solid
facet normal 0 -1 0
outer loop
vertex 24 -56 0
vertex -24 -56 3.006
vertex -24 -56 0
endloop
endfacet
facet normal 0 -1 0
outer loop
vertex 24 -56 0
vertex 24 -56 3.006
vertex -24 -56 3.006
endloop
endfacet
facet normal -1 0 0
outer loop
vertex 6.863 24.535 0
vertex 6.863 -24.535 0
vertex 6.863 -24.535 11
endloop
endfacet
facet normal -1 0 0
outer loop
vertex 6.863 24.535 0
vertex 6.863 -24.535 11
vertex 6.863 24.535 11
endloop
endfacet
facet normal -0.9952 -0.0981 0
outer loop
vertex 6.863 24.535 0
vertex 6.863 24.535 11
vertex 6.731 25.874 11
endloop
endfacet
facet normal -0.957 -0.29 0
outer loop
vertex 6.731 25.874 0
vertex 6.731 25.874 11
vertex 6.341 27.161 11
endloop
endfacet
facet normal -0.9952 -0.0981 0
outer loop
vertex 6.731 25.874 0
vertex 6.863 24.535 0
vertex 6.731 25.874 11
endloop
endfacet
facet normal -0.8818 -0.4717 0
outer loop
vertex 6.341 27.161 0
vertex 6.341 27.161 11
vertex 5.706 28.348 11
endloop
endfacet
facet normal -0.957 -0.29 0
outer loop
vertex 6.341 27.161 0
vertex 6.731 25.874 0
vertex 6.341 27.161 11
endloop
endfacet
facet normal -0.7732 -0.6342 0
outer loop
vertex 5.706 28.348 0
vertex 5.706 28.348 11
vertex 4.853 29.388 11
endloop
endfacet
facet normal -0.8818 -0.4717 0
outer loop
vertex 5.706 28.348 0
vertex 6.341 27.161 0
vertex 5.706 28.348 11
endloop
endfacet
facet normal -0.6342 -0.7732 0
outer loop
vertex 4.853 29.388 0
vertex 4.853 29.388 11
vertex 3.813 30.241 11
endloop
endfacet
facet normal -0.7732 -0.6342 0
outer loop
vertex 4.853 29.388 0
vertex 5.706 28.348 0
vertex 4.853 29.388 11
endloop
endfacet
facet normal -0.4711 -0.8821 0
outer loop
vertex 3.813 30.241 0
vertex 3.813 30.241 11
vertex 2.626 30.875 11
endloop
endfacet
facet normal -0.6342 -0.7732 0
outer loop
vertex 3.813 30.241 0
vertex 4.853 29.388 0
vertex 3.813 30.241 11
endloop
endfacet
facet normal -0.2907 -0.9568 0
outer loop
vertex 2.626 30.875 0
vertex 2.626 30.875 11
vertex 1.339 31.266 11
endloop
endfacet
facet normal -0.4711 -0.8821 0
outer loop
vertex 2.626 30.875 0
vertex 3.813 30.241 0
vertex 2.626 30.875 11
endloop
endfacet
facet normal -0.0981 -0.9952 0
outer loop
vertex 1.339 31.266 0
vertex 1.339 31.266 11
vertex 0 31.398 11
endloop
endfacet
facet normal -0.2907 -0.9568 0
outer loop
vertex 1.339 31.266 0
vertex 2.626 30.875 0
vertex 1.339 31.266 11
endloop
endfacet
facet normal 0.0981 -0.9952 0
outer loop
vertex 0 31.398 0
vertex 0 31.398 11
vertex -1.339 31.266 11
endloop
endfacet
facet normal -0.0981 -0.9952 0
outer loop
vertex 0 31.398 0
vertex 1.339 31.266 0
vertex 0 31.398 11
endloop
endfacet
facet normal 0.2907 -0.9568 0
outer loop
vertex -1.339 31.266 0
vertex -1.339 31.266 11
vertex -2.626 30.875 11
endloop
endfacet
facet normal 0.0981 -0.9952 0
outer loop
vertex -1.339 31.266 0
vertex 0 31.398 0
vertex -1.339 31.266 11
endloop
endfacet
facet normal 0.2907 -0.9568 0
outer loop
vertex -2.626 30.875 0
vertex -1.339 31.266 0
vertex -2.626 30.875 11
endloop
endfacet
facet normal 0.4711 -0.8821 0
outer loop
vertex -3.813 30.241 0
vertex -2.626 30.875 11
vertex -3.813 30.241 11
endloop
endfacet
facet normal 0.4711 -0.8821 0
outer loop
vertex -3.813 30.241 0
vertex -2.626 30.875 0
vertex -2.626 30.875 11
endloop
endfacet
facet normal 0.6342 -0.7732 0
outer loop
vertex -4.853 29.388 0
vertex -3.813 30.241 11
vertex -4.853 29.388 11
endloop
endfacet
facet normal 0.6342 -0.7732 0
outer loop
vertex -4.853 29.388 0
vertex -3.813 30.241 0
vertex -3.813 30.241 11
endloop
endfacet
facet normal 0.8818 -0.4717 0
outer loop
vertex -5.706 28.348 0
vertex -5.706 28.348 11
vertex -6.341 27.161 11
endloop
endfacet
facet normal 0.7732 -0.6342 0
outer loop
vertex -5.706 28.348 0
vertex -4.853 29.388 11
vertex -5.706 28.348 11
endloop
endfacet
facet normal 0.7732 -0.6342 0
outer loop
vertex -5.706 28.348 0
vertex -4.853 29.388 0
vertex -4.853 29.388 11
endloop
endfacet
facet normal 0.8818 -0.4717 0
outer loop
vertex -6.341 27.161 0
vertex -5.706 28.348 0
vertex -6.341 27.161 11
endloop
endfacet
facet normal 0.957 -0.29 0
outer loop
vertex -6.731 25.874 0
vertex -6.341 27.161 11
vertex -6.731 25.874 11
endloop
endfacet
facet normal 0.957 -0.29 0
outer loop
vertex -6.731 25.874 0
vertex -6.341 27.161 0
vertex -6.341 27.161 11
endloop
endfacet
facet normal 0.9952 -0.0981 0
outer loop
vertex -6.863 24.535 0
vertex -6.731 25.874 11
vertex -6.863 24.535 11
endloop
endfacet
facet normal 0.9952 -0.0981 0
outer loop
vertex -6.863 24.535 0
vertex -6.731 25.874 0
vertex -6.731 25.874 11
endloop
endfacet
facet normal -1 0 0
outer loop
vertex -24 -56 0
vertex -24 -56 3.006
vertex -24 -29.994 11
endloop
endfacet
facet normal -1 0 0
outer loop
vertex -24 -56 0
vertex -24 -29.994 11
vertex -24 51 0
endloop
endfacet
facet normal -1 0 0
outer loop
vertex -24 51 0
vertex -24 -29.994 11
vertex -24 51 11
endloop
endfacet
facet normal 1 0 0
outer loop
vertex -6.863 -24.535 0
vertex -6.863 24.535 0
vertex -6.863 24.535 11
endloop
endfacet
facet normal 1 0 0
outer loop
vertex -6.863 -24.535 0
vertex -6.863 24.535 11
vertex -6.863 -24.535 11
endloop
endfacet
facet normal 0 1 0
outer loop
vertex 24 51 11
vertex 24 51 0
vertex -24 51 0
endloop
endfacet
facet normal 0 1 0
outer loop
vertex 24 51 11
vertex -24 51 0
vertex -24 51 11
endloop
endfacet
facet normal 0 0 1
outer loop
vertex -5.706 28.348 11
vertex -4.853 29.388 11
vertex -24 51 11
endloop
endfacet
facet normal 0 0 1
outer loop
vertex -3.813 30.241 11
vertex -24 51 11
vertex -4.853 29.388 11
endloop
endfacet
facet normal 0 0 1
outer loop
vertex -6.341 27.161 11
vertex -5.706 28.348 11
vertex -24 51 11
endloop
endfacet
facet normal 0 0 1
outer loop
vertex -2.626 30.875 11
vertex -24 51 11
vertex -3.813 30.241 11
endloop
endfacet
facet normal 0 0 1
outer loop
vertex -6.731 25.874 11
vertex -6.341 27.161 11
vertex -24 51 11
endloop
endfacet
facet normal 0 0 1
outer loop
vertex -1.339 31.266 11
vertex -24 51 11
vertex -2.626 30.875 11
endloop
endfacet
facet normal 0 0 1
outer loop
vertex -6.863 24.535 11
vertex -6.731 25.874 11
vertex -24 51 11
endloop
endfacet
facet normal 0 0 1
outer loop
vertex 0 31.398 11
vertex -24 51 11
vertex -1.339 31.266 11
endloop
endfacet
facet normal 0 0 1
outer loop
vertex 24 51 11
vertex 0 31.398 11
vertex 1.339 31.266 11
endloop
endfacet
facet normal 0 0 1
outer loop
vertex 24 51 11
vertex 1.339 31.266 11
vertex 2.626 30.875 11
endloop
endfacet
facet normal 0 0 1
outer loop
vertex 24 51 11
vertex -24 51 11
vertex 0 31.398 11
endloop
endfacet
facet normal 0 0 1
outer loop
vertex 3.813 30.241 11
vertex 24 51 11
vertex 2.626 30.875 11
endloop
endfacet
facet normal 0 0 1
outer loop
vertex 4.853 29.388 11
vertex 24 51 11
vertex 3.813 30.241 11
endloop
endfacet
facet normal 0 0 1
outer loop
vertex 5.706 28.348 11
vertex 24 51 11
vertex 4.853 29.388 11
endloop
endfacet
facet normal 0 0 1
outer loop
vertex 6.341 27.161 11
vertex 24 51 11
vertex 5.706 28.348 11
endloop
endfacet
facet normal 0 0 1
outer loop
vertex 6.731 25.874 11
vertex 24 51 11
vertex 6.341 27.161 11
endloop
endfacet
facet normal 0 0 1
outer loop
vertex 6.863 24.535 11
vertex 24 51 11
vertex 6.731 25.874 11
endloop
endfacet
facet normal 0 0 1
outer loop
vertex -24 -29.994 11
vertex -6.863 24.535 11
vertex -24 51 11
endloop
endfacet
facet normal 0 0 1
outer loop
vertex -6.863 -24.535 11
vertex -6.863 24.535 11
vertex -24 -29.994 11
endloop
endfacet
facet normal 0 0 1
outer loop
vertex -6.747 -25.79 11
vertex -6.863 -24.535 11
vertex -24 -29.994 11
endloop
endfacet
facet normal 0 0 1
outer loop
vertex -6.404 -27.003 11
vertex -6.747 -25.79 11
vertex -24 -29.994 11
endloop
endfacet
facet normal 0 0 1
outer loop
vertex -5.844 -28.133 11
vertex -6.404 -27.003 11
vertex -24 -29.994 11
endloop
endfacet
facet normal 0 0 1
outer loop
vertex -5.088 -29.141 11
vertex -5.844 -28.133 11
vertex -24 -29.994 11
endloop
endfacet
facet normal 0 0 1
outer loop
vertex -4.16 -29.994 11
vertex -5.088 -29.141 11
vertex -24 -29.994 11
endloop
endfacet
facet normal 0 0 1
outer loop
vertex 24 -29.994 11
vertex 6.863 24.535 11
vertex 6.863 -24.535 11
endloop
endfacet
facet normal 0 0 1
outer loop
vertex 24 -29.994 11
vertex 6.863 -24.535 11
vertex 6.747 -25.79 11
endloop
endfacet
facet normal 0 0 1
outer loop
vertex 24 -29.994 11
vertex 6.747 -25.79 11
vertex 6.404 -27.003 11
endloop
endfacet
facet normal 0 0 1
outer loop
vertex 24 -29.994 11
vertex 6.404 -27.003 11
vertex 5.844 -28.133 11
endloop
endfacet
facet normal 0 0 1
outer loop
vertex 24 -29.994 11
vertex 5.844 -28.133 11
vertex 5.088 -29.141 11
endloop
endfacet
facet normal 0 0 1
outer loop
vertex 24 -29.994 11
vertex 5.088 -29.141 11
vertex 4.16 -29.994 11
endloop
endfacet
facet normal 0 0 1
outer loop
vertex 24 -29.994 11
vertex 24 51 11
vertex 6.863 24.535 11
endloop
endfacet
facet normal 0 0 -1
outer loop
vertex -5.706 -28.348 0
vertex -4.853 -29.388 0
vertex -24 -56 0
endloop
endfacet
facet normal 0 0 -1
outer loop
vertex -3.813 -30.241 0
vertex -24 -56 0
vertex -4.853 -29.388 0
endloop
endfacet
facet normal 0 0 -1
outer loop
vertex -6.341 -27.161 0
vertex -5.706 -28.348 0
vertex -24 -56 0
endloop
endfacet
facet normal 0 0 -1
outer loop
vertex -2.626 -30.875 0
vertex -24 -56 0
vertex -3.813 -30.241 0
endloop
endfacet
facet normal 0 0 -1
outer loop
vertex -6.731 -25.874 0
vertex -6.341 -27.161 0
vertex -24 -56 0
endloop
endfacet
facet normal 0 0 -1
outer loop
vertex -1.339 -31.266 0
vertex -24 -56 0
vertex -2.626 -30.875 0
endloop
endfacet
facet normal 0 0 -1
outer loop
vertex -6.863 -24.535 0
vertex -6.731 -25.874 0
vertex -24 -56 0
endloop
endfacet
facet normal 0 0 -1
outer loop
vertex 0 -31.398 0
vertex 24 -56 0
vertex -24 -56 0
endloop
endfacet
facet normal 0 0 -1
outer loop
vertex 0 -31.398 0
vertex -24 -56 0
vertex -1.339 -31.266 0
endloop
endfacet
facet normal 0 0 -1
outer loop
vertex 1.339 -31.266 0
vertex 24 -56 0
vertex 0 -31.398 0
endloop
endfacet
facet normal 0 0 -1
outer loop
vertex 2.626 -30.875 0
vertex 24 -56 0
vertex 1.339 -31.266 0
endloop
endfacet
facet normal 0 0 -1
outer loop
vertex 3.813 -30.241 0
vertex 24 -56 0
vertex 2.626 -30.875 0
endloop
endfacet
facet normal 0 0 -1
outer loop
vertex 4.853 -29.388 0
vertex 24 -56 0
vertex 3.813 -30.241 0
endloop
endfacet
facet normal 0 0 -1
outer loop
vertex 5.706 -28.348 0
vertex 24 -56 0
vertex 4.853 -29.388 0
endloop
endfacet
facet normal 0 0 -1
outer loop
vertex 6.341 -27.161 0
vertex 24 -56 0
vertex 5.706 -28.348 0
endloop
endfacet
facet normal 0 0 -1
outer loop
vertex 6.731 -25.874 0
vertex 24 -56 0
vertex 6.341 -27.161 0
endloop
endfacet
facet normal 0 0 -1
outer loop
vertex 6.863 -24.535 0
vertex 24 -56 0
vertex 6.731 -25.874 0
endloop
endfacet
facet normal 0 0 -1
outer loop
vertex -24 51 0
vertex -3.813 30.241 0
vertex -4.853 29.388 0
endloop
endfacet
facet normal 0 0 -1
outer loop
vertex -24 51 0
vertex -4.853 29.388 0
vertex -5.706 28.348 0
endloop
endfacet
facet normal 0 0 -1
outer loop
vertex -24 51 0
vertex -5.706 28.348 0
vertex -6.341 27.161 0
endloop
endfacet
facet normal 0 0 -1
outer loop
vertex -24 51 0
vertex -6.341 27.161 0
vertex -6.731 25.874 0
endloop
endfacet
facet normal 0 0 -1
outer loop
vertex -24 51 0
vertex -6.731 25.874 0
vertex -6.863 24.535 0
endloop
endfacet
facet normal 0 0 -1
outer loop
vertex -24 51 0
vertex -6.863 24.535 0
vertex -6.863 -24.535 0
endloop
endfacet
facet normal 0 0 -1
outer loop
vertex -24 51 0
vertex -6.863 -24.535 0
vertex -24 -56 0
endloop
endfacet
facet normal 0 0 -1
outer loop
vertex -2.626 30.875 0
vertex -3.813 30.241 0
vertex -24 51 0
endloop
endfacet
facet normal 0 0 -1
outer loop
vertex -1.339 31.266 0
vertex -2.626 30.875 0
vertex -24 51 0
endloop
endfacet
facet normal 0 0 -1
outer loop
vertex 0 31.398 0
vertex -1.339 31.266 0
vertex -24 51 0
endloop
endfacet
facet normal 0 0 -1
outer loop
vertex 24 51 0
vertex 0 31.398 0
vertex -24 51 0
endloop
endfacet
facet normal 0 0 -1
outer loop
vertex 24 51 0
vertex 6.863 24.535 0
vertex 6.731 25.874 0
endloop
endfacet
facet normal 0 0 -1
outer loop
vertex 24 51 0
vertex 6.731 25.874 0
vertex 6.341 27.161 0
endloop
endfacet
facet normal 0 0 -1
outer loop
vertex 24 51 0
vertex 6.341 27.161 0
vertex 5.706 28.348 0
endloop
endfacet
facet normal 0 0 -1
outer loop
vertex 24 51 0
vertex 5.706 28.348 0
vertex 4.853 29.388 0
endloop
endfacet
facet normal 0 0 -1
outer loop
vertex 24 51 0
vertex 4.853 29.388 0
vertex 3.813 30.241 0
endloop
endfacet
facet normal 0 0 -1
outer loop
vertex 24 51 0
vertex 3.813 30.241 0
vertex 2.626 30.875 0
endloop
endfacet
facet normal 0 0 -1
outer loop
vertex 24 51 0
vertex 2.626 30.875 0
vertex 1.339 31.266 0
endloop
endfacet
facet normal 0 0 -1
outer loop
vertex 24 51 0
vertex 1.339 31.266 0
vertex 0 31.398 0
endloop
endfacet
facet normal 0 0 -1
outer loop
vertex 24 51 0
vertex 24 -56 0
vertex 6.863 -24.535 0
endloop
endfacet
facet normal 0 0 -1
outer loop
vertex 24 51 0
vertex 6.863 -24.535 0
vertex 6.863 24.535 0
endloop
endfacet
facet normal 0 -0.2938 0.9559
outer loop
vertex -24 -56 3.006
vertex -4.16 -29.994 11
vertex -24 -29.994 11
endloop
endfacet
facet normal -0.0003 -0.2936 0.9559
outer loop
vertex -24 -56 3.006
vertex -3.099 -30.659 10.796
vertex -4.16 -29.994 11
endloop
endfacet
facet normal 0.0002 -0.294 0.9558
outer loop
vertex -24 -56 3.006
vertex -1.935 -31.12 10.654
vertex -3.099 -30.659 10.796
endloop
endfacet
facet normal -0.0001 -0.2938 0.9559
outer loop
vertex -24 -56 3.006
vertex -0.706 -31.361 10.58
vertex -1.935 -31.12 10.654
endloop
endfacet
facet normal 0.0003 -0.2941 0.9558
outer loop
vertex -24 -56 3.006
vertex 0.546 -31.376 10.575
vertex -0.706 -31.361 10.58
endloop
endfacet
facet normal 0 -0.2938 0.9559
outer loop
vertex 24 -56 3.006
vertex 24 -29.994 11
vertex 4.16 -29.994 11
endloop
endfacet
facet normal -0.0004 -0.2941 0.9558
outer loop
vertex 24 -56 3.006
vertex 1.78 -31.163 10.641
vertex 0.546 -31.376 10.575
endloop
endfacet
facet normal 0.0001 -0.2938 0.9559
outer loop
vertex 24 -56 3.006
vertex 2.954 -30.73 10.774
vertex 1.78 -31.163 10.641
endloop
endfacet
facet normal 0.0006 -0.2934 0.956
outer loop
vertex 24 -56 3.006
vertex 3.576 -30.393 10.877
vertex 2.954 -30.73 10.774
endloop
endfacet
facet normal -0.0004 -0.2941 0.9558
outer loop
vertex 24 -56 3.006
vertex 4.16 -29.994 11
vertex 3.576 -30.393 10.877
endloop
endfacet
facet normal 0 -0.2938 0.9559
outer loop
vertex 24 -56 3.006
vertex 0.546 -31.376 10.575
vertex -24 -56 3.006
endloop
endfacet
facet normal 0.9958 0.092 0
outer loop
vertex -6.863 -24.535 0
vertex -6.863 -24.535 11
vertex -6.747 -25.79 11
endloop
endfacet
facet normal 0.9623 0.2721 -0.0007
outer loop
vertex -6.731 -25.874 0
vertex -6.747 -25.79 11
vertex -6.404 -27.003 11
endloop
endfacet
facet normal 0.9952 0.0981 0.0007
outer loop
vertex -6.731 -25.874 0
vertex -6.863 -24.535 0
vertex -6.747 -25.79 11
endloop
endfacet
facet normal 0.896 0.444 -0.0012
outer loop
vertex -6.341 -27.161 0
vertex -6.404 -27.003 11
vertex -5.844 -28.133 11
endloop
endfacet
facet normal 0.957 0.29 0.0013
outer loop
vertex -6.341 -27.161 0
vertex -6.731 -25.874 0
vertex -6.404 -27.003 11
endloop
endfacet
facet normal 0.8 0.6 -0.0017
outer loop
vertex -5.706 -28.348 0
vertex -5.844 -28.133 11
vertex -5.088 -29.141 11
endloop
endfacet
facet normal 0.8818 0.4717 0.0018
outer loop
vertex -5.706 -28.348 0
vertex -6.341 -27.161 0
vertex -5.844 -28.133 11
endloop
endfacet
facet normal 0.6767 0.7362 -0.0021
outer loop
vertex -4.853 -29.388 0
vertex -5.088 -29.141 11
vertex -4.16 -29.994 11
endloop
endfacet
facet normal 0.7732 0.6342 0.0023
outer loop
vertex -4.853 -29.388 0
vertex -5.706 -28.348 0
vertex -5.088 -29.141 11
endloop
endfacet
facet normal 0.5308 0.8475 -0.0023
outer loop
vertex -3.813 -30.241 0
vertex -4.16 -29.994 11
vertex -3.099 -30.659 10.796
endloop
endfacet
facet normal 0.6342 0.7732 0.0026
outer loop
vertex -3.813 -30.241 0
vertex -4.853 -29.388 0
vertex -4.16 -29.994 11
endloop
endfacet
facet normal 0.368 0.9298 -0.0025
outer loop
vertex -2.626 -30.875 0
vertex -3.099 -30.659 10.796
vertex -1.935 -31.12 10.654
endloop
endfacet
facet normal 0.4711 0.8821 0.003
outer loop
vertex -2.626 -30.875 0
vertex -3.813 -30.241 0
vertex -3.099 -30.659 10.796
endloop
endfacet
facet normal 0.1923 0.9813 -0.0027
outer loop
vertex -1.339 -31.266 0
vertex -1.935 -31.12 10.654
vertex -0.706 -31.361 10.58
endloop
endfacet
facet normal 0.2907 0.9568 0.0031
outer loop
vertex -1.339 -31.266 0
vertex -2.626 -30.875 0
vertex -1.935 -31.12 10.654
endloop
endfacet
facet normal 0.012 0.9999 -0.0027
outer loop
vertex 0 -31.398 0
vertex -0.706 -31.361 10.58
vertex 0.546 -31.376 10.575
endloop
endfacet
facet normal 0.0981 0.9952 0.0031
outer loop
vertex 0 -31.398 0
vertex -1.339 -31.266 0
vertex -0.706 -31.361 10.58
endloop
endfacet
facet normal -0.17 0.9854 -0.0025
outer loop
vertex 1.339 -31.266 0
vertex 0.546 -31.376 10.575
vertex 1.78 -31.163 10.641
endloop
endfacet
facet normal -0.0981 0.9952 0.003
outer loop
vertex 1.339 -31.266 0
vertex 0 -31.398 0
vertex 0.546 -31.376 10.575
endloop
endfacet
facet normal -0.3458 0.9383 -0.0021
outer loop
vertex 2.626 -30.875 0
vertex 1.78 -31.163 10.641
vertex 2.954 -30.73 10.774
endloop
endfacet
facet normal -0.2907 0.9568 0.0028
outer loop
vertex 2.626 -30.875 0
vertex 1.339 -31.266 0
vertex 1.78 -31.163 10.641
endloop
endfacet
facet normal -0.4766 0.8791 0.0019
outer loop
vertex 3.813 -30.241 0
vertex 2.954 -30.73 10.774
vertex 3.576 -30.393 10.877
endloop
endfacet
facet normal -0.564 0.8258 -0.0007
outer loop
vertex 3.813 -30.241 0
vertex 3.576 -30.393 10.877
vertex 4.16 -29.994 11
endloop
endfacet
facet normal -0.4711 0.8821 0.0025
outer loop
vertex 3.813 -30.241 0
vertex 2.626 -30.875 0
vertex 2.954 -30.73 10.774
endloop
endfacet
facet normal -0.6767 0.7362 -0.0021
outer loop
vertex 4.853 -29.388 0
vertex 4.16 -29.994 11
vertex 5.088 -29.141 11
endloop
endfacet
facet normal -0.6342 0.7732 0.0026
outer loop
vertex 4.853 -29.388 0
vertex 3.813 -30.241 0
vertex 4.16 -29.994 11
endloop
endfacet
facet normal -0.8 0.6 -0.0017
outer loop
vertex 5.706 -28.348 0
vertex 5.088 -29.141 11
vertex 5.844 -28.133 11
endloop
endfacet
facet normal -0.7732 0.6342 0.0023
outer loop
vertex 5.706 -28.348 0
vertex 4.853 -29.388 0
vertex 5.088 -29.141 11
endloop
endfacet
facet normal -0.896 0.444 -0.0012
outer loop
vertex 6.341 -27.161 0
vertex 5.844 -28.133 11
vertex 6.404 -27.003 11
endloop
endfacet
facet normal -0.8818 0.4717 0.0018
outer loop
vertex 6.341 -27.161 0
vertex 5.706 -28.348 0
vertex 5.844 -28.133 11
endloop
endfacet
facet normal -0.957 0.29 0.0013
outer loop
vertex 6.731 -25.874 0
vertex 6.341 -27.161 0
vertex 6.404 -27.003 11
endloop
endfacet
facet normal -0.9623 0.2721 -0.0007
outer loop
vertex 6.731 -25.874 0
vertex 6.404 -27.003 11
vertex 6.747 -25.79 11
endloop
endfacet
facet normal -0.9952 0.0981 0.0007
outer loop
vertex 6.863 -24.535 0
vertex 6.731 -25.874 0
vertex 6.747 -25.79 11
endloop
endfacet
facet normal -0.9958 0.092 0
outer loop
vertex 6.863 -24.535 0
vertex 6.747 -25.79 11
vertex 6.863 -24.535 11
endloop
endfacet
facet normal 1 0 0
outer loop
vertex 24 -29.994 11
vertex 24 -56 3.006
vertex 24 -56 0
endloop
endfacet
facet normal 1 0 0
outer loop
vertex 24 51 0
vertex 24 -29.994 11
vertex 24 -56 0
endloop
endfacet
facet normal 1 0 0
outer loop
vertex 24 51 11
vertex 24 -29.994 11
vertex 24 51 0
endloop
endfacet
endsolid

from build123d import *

# Parameters (mm, degrees)
F1_DEPTH = 24
F3_DEPTH = 11.001
F4_DEPTH = 25.8


# Not quite as in the source:
# - a feature names something its author has since deleted; it is built from what else it names


with BuildPart() as f1:
    # F0 (on Right) → F1 (new body, symmetric)
    with BuildSketch(Plane.YZ):
        Polygon((-56, 3.0059725977), (-56, 0), (51, 0), (51, 11), (-29.9936849624, 11), align=None)
    extrude(amount=F1_DEPTH, both=True)

    # F2 (on Top) → F3 (cut, through all)
    with BuildSketch(Plane.XY):
        with BuildLine():
            ThreePointArc((-6.8629677407, 24.5349109173), (0, 17.6719431765), (6.8629677407, 24.5349109173))
            Line((6.8629677407, 24.5349109173), (-6.8629677407, 24.5349109173))
        make_face()
        with BuildLine():
            Line((-6.8629677407, 24.5349109173), (6.8629677407, 24.5349109173))
            ThreePointArc((6.8629677407, 24.5349109173), (0, 31.397878658), (-6.8629677407, 24.5349109173))
        make_face()
        with BuildLine():
            Line((6.8629677407, -24.5349109173), (6.8629677407, 24.5349109173))
            ThreePointArc((6.8629677407, 24.5349109173), (0, 17.6719431765), (-6.8629677407, 24.5349109173))
            Line((-6.8629677407, 24.5349109173), (-6.8629677407, -24.5349109173))
            ThreePointArc((-6.8629677407, -24.5349109173), (0, -17.6719431765), (6.8629677407, -24.5349109173))
        make_face()
        with BuildLine():
            ThreePointArc((-6.8629677407, -24.5349109173), (0, -31.397878658), (6.8629677407, -24.5349109173))
            Line((6.8629677407, -24.5349109173), (-6.8629677407, -24.5349109173))
        make_face()
        with BuildLine():
            Line((-6.8629677407, -24.5349109173), (6.8629677407, -24.5349109173))
            ThreePointArc((6.8629677407, -24.5349109173), (0, -17.6719431765), (-6.8629677407, -24.5349109173))
        make_face()
    extrude(amount=F3_DEPTH, mode=Mode.SUBTRACT)

    # F2 (on Top) → F4 (cut)
    with BuildSketch(Plane.XY):
        with BuildLine():
            ThreePointArc((-6.8629677407, 24.5349109173), (0, 17.6719431765), (6.8629677407, 24.5349109173))
            Line((6.8629677407, 24.5349109173), (-6.8629677407, 24.5349109173))
        make_face()
        with BuildLine():
            Line((-6.8629677407, 24.5349109173), (6.8629677407, 24.5349109173))
            ThreePointArc((6.8629677407, 24.5349109173), (0, 31.397878658), (-6.8629677407, 24.5349109173))
        make_face()
        with BuildLine():
            Line((6.8629677407, -24.5349109173), (6.8629677407, 24.5349109173))
            ThreePointArc((6.8629677407, 24.5349109173), (0, 17.6719431765), (-6.8629677407, 24.5349109173))
            Line((-6.8629677407, 24.5349109173), (-6.8629677407, -24.5349109173))
            ThreePointArc((-6.8629677407, -24.5349109173), (0, -17.6719431765), (6.8629677407, -24.5349109173))
        make_face()
        with BuildLine():
            ThreePointArc((-6.8629677407, -24.5349109173), (0, -31.397878658), (6.8629677407, -24.5349109173))
            Line((6.8629677407, -24.5349109173), (-6.8629677407, -24.5349109173))
        make_face()
        with BuildLine():
            Line((-6.8629677407, -24.5349109173), (6.8629677407, -24.5349109173))
            ThreePointArc((6.8629677407, -24.5349109173), (0, -17.6719431765), (-6.8629677407, -24.5349109173))
        make_face()
    extrude(amount=F4_DEPTH, mode=Mode.SUBTRACT)


solid = f1.part
